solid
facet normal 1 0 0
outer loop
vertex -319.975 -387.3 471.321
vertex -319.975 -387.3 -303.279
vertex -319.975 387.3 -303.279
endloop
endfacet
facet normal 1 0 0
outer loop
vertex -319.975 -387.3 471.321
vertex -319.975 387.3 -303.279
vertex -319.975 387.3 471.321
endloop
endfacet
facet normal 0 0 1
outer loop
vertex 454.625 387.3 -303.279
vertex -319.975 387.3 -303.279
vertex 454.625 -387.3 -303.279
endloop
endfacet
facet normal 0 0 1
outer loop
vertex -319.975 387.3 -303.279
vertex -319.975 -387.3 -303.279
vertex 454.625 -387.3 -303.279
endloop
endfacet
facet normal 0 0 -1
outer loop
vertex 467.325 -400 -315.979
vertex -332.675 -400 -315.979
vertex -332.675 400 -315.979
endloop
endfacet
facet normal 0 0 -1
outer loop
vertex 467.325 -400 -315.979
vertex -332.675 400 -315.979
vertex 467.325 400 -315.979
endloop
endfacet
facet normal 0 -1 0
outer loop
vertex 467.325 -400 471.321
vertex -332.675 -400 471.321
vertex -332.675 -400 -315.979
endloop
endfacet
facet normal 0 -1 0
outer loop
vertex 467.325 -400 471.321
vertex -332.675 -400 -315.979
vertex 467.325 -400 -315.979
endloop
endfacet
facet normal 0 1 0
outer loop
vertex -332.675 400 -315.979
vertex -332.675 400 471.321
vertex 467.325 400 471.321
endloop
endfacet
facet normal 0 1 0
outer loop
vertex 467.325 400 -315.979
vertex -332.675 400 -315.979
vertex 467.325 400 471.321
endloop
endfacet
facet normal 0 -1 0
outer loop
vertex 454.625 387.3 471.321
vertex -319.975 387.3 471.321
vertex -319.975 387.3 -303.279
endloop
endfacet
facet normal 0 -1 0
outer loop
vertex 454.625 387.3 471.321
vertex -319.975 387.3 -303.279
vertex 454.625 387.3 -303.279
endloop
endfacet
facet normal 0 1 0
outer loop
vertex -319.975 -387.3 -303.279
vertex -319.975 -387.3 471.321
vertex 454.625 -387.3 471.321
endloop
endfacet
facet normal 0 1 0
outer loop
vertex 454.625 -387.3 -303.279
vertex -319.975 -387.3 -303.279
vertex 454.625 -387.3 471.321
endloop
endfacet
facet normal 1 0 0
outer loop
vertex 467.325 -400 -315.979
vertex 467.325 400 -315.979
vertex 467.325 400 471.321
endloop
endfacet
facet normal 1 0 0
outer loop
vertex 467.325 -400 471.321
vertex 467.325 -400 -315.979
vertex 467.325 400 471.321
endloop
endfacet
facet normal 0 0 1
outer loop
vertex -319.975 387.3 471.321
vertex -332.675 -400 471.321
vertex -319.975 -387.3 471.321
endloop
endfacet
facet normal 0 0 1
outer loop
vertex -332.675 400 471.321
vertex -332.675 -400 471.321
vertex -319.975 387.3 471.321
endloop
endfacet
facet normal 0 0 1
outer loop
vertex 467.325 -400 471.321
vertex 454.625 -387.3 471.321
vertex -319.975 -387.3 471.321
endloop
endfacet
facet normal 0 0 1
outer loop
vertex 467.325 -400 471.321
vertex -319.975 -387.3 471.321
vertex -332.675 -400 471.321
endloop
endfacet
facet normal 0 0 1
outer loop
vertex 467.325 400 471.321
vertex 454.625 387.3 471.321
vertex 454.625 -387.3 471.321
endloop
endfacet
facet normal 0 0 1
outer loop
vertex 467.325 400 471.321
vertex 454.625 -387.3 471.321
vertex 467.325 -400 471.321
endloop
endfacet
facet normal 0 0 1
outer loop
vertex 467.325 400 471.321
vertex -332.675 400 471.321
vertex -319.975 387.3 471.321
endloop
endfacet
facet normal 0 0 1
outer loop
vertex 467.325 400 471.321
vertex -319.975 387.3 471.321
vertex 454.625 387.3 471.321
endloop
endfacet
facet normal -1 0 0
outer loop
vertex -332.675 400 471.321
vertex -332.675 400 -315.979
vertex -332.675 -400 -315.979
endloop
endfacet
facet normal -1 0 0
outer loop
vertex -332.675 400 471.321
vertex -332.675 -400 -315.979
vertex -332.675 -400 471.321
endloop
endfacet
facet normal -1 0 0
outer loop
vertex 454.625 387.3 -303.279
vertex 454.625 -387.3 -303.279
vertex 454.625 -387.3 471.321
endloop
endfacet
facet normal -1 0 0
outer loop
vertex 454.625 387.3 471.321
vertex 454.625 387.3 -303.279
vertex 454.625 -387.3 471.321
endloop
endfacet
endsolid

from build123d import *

# Parameters (mm, degrees)
F0_W     = 800
F0_H     = 800
F1_DEPTH = 400
F2_T     = -12.7
F3_W     = 1.108050679
F3_H     = 800
F3_W_2   = 798.891949321
F4_DEPTH = 12.7


with BuildPart() as f1:
    # F0 (on Front) → F1 (new body, symmetric)
    with BuildSketch(Plane.XZ):
        with Locations((67.3246156823, 84.0211848542)):
            Rectangle(F0_W, F0_H)
    extrude(amount=F1_DEPTH, both=True)

    # F2 (hollow: no face is removed)
    offset(amount=F2_T, mode=Mode.SUBTRACT)

    # F3 (on face) → F4 (cut)
    with BuildSketch(Plane.XY.offset(484.0211848542)):
        with Locations((-332.1213589782, 0)):
            Rectangle(F3_W, F3_H)
        with Locations((67.8786410218, 0)):
            Rectangle(F3_W_2, F3_H)
    extrude(amount=-F4_DEPTH, mode=Mode.SUBTRACT)


solid = f1.part
